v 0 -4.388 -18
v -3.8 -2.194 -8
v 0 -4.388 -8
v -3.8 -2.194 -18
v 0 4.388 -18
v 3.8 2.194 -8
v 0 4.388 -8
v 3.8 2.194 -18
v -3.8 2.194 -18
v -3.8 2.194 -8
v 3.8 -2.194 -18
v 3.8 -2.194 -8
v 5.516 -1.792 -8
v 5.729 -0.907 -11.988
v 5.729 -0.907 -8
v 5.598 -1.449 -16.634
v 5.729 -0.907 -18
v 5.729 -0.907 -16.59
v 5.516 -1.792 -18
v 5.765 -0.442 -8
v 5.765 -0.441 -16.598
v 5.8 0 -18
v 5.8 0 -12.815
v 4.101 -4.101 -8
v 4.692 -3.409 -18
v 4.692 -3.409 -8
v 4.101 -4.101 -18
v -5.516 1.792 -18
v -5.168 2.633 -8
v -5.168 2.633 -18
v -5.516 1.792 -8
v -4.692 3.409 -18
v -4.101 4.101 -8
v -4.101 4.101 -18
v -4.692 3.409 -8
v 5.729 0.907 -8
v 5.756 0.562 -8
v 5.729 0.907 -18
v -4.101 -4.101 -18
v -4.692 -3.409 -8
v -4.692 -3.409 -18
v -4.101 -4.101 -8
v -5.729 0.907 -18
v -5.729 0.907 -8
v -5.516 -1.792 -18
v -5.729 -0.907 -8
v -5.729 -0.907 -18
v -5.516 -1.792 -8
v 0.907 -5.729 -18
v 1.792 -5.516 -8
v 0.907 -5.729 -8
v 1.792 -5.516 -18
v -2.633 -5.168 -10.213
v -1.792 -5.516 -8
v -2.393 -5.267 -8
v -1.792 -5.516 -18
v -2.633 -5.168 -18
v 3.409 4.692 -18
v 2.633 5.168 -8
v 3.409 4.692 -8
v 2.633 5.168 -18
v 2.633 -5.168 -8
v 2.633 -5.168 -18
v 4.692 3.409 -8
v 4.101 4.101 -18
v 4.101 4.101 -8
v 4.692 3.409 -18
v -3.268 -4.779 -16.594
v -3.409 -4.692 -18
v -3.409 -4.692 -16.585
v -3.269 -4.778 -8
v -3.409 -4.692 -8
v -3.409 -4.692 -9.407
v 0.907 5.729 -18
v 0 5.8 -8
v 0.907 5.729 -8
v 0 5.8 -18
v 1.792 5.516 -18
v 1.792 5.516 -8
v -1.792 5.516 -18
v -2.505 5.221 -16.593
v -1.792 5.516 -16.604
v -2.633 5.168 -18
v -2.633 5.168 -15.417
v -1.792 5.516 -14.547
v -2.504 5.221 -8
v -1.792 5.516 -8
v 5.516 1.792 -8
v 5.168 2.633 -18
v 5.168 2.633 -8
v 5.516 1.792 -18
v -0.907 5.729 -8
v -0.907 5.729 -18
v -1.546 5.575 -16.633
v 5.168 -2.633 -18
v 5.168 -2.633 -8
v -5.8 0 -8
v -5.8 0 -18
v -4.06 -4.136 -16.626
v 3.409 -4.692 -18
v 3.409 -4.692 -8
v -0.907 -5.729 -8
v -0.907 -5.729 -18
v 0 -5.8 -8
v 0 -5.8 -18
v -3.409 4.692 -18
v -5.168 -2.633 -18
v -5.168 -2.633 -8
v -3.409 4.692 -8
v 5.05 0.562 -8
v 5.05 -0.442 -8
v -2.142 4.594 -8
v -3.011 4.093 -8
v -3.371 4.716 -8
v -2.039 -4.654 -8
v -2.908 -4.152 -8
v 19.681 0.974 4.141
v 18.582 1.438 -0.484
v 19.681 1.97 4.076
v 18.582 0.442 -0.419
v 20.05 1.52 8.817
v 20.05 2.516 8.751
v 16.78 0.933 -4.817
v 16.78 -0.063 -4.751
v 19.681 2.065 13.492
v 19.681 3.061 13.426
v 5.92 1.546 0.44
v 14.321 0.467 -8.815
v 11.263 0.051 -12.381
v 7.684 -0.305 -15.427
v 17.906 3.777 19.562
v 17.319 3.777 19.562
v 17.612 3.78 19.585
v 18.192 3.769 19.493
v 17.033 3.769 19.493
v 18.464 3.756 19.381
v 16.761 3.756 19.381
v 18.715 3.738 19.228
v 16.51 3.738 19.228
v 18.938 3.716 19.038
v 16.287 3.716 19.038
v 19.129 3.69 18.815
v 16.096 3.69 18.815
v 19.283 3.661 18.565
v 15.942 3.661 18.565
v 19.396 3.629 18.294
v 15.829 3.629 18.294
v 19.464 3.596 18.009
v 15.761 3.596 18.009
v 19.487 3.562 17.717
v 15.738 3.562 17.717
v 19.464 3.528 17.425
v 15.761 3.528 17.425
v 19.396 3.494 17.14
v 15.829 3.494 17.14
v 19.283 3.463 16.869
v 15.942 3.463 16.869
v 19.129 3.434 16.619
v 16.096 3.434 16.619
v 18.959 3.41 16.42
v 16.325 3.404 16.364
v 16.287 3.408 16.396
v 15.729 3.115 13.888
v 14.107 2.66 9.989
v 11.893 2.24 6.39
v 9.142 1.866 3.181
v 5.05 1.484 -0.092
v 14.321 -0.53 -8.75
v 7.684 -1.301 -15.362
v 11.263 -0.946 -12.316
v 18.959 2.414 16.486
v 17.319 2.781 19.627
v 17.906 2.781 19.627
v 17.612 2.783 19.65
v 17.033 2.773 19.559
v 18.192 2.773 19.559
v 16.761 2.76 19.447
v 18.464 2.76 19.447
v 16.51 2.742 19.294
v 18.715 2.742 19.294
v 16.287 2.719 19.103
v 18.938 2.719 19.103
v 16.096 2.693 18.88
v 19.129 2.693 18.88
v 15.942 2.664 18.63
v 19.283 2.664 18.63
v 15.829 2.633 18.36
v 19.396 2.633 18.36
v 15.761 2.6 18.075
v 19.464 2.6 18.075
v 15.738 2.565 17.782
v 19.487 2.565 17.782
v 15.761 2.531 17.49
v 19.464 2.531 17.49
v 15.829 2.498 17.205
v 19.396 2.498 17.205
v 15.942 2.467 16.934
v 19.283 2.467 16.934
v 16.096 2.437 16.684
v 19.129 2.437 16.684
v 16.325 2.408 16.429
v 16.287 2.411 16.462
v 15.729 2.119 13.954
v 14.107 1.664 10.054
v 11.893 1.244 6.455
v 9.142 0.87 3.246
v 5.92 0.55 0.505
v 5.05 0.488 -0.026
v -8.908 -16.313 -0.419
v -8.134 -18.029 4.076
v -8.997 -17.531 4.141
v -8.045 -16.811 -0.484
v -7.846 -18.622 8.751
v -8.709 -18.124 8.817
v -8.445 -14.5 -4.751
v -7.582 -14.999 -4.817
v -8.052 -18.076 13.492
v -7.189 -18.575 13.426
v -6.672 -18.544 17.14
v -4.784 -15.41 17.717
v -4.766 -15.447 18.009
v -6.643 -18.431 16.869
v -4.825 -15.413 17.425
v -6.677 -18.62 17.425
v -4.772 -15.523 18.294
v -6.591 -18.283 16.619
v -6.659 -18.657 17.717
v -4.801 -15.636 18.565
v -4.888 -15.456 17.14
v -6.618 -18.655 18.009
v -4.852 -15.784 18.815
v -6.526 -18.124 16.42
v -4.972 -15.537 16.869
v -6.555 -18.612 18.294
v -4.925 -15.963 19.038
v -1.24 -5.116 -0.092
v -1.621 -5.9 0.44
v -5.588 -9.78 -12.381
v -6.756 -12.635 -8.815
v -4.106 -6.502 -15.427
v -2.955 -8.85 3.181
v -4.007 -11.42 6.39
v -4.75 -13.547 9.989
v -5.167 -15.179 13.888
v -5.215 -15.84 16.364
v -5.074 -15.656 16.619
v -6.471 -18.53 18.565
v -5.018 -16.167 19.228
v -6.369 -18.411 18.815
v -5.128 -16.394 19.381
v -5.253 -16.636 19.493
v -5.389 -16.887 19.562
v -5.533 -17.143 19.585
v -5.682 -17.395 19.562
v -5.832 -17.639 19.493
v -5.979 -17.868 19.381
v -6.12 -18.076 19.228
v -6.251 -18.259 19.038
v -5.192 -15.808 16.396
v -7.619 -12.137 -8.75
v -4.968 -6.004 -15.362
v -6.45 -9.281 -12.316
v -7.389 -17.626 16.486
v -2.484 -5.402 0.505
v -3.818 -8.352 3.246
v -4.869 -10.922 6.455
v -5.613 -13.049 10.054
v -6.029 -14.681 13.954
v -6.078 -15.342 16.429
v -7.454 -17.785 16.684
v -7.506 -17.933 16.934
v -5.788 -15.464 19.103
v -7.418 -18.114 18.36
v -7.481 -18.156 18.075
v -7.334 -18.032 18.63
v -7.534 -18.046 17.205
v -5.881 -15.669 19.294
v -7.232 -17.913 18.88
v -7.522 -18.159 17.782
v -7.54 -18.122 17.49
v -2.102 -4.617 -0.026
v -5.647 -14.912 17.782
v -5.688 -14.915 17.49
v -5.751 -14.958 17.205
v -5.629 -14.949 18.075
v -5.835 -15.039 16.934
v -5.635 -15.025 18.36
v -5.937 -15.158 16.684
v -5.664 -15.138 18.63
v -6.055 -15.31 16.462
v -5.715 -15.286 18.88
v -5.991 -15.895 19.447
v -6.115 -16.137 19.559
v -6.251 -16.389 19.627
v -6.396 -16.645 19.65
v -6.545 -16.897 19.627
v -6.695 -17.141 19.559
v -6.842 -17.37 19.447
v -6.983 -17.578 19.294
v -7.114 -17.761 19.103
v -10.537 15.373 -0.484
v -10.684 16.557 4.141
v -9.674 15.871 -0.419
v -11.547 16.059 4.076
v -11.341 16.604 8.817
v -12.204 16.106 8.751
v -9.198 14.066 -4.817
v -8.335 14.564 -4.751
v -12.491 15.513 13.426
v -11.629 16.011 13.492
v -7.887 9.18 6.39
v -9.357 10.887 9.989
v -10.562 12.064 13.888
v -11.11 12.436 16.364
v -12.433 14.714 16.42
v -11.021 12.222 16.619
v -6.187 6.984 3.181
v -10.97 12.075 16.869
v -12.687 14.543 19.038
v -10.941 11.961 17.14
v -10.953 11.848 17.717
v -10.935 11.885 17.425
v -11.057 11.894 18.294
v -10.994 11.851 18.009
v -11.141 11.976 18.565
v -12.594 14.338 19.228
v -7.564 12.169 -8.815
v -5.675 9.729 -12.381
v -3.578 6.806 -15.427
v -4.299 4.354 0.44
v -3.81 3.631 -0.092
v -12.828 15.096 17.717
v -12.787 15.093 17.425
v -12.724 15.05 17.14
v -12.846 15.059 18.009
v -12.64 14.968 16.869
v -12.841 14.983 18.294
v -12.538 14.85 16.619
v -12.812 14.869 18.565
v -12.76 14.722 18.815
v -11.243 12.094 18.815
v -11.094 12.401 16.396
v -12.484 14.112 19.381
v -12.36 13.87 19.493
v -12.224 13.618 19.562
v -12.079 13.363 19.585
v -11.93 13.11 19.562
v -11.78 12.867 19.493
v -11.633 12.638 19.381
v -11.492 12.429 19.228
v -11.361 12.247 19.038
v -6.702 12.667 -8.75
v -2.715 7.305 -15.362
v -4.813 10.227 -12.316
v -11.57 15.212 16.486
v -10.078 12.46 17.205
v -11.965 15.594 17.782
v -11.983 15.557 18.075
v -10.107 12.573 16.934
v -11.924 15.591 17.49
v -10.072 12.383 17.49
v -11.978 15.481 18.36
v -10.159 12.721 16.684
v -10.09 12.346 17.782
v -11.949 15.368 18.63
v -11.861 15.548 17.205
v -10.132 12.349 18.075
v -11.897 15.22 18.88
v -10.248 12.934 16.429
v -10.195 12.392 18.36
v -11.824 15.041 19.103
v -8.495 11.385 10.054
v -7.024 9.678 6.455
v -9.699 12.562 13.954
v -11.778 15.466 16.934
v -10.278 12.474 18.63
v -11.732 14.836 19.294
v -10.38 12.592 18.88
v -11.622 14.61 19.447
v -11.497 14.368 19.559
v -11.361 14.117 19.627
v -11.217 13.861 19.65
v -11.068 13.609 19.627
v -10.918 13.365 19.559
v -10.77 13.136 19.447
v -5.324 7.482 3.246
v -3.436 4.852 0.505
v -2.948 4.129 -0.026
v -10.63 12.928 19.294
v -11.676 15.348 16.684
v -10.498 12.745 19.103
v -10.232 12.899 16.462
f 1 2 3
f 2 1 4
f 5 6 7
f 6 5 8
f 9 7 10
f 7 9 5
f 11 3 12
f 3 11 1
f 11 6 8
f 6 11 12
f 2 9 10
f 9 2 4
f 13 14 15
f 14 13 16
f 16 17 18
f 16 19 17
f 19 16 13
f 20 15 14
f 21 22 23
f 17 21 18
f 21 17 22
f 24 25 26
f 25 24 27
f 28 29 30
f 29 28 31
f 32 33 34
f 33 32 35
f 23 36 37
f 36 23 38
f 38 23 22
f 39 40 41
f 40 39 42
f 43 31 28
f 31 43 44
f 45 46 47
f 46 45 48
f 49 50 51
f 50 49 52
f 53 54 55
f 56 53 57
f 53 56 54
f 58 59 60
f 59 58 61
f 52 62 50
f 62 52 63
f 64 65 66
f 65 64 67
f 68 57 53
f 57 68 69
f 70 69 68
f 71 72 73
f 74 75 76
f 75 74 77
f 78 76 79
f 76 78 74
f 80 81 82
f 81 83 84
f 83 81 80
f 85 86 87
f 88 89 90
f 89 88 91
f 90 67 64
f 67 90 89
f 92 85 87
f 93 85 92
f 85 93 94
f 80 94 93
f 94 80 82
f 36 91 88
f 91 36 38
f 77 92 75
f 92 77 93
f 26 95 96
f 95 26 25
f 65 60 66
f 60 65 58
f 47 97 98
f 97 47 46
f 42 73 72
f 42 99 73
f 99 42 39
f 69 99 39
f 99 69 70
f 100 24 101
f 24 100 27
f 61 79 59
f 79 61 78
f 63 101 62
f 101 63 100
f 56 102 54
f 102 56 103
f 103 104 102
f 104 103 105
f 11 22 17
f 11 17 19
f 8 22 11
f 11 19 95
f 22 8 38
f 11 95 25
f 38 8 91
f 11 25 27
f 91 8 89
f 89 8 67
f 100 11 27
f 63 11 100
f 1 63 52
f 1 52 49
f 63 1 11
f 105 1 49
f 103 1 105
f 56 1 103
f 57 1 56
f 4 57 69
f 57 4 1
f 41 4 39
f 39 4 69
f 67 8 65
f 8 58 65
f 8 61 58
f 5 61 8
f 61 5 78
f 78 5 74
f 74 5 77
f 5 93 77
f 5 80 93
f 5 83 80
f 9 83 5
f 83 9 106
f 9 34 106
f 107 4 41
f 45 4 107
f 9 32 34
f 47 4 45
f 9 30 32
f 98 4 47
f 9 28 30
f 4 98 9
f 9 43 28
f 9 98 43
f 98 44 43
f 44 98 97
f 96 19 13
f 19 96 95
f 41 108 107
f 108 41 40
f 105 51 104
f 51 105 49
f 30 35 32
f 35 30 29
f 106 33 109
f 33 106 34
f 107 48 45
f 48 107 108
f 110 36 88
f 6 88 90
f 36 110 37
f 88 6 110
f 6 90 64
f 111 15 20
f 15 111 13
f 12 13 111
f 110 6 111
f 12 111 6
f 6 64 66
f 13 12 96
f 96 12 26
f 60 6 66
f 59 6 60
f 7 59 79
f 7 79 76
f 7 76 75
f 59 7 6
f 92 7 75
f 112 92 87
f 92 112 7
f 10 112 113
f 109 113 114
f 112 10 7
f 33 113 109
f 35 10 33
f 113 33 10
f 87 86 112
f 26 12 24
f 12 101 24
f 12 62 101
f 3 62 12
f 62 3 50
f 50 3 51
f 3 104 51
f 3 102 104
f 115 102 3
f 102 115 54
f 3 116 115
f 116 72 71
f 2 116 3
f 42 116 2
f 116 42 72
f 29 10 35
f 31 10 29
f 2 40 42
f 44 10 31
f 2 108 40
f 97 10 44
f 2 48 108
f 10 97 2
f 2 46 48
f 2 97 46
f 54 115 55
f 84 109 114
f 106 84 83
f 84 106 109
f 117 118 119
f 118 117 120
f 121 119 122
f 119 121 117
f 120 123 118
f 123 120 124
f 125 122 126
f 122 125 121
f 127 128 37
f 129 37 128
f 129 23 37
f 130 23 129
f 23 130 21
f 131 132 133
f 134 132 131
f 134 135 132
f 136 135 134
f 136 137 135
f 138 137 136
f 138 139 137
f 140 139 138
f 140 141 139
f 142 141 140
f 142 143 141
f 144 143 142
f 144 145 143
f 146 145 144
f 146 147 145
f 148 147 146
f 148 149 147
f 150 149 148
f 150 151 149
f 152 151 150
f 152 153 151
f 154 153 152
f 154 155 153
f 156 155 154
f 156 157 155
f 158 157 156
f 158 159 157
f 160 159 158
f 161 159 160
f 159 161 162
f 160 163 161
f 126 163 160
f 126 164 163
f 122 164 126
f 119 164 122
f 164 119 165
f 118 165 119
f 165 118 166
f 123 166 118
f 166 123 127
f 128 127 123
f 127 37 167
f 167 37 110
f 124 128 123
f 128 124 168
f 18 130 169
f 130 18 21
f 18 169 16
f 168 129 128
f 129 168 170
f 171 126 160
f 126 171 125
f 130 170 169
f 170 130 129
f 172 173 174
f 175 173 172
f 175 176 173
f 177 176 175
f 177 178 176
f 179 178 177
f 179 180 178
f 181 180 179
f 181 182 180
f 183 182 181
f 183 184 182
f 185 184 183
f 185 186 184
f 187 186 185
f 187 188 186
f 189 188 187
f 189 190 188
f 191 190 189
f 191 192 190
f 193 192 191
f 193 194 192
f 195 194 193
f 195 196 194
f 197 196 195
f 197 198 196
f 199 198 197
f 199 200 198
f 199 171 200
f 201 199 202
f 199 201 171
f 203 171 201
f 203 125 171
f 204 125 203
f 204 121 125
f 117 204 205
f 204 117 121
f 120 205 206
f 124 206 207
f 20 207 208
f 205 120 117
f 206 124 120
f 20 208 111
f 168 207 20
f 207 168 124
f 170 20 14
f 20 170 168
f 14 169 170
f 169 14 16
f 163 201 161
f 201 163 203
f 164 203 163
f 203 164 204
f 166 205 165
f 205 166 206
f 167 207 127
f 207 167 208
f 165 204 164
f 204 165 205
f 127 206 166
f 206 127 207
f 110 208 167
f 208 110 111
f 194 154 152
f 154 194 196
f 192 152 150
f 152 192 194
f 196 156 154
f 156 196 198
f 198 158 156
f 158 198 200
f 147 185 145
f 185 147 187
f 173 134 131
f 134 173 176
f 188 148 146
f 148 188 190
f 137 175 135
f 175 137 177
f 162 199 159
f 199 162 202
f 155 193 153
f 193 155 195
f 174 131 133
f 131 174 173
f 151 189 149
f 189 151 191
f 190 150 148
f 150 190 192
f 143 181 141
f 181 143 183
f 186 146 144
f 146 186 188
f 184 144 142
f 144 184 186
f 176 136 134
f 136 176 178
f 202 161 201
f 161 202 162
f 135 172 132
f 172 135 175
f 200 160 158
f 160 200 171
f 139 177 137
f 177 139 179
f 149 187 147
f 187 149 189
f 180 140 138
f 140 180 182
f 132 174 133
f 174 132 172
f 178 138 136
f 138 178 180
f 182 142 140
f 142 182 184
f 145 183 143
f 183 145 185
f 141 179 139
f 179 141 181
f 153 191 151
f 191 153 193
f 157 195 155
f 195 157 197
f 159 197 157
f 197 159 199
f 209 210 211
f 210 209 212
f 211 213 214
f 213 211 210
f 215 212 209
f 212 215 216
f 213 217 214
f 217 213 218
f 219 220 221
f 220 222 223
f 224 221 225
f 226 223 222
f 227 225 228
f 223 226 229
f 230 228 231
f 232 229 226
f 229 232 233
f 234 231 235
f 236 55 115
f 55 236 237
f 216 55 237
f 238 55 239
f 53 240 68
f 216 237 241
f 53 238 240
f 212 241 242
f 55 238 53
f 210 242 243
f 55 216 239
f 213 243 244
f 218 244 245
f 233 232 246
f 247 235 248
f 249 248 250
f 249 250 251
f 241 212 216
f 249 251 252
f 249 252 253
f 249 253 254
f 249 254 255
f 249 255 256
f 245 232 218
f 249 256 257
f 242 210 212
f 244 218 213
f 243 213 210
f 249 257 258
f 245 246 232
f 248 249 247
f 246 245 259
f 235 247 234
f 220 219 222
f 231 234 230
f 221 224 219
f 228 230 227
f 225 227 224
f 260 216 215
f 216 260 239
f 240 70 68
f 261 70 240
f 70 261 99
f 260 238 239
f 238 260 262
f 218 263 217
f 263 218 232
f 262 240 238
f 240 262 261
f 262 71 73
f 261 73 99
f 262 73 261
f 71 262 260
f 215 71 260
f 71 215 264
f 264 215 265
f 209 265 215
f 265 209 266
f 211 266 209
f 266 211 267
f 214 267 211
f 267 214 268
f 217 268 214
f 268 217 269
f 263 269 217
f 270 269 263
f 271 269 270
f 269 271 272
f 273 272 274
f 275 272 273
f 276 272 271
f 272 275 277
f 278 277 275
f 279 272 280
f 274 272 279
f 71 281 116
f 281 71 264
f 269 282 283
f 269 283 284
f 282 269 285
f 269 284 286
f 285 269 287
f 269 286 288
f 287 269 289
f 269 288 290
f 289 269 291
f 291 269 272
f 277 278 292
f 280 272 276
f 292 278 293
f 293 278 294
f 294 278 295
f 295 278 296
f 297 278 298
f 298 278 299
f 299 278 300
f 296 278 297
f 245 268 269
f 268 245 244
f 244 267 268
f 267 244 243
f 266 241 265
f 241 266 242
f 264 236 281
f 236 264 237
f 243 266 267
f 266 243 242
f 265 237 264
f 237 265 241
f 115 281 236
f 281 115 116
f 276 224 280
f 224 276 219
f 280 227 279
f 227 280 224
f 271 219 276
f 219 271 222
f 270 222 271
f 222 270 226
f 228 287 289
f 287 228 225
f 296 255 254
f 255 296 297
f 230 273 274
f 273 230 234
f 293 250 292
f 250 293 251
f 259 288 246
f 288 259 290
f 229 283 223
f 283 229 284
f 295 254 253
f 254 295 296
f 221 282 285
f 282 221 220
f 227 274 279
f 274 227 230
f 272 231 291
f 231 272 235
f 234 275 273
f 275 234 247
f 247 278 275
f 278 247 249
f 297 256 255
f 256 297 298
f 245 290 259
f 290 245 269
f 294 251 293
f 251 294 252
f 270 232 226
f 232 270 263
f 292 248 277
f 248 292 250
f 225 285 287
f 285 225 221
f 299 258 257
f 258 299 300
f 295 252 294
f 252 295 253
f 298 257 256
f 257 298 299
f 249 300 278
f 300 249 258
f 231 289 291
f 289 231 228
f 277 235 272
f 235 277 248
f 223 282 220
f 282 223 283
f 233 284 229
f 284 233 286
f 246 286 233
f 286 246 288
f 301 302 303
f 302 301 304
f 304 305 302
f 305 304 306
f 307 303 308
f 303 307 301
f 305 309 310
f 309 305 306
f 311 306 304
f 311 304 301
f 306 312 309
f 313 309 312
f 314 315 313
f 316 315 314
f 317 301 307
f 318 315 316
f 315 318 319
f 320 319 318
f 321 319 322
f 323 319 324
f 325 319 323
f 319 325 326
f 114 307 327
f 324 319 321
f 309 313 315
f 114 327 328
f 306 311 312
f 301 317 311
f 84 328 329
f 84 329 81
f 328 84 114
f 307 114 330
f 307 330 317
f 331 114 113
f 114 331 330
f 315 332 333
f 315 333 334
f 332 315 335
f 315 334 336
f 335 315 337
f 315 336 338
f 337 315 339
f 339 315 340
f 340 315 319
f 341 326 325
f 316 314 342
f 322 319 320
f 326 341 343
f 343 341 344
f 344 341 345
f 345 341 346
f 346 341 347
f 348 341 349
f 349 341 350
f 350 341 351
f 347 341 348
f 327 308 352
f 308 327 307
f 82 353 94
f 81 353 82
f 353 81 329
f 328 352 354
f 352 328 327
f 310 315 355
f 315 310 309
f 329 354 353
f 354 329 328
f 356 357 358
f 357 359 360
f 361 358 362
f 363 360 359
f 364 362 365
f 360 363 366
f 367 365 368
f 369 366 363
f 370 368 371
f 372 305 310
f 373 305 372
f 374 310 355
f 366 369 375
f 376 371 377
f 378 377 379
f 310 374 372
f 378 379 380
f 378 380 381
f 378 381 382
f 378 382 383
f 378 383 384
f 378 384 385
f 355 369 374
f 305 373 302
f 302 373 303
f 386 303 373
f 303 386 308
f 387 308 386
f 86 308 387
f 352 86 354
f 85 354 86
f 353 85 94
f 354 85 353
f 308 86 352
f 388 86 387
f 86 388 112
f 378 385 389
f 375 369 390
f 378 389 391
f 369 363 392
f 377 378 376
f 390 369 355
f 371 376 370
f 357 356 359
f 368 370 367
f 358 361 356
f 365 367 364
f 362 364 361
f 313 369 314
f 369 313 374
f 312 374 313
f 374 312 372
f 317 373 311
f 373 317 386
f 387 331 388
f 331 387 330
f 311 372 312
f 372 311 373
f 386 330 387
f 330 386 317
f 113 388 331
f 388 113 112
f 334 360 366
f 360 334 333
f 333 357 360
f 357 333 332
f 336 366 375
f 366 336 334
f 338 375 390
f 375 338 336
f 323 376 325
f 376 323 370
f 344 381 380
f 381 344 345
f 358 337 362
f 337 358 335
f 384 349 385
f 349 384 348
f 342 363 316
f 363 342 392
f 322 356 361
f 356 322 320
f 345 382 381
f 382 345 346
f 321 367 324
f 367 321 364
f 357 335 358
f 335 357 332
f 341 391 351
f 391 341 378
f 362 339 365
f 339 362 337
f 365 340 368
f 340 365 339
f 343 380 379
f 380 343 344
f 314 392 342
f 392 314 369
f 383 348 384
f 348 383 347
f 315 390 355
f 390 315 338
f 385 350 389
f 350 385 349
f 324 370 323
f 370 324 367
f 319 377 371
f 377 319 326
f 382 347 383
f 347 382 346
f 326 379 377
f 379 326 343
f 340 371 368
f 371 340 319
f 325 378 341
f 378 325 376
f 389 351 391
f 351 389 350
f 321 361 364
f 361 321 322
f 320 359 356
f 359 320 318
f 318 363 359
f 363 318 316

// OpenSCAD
/*
 * Convertible Pencil Rocket / Pencil Stand
 *
 * by Alex Franke (CodeCreations), Nov 2012
 * http://www.theFrankes.com
 * 
 * Licenced under Creative Commons Attribution - Non-Commercial - Share Alike 3.0 
 * 
 * INSTRUCTIONS: Choose some values in the "User-defined values" section, render, and print. 
 * 
 * v1.10, Dec 1, 2012: Added spin angle to angle fins for spinning.
 * v1.00, Nov 28, 2012: Initial Release.
 *
 * TODO: 
 *   * Nothing at this time. 
 */

/////////////////////////////////////////////////////////////////////////////
// User-defined values... 
/////////////////////////////////////////////////////////////////////////////

finThickness     = 1;    // Thickness of fins
finCount         = 3;    // Number of fins
finInset         = 0.75; // Distance fins are inset from surface
finScale         = 0.75; // Scale the fins larger (>1) or smaller (<1)
spinAngle        = -5;   // Rotation of fins in order to provide spin
pencilInDiameter = 7.6;  // Diameter of pencil (flat to flat for hex) 6.85 == Ticonderoga #2
bandThickness    = 2;    // The maximum thickness of the band the fins are attached to 
bandHeight       = 10;   // The height of the band
bandTranslation  = 8;    // The distance the band is translated toward the top of the fins

$fn              = 40;   // Overall curve quality


/////////////////////////////////////////////////////////////////////////////
// The code... 
/////////////////////////////////////////////////////////////////////////////

rotate([180,0,0]) 
union() {
	translate([0,0,bandTranslation]) 
	difference() {
		cylinder(h=bandHeight, r=pencilInDiameter/2+bandThickness);
	
		translate([0,0,(bandHeight)/2]) 
			rotate([0,0,30]) 
			nut([pencilInDiameter, bandHeight+1]);
	
	}
	
	for( i=[0:finCount-1] ) {
	
		rotate([0,0,(360/finCount)*i]) 
		translate([pencilInDiameter/2+bandThickness-finInset, 0, 0]) 
		rotate([90,0,0]) 
		scale([finScale,finScale,1]) 
		translate([0,11.35,0]) 
		rotate([spinAngle,0,0]) 
		fin(); 
	
	}
}

/////////////////////////////////////////////////////////////////////////////
// Modules... 
/////////////////////////////////////////////////////////////////////////////

module fin() {
	translate([-20,-11.8-11.35,0]) 
	union() {
		difference() { 
			cylinder(h=finThickness, r=40, center=true);
			
			translate([0,-18,0]) 
				cylinder(h=finThickness+1, r=36, center=true);
	
			translate([-25,0,0]) 
				cube([90,90,finThickness+1], center=true);

			translate([36,-16,0]) 
				cube([10,10,finThickness+1], center=true);
		}

		translate([36.75,-12,0]) 
			cylinder(h=finThickness, r=2.5, center=true);
	}
}


// Same nutty code I use in my other designs...
// nutSize = [inDiameter,thickness]
module nut( nutSize ) { 
	side = nutSize[0] * tan( 180/6 );
	if ( nutSize[0] * nutSize[1] != 0 ) {
		for ( i = [0 : 2] ) {
			rotate( i*120, [0, 0, 1]) 
				cube( [side, nutSize[0], nutSize[1]], center=true );
		}
	}
}
